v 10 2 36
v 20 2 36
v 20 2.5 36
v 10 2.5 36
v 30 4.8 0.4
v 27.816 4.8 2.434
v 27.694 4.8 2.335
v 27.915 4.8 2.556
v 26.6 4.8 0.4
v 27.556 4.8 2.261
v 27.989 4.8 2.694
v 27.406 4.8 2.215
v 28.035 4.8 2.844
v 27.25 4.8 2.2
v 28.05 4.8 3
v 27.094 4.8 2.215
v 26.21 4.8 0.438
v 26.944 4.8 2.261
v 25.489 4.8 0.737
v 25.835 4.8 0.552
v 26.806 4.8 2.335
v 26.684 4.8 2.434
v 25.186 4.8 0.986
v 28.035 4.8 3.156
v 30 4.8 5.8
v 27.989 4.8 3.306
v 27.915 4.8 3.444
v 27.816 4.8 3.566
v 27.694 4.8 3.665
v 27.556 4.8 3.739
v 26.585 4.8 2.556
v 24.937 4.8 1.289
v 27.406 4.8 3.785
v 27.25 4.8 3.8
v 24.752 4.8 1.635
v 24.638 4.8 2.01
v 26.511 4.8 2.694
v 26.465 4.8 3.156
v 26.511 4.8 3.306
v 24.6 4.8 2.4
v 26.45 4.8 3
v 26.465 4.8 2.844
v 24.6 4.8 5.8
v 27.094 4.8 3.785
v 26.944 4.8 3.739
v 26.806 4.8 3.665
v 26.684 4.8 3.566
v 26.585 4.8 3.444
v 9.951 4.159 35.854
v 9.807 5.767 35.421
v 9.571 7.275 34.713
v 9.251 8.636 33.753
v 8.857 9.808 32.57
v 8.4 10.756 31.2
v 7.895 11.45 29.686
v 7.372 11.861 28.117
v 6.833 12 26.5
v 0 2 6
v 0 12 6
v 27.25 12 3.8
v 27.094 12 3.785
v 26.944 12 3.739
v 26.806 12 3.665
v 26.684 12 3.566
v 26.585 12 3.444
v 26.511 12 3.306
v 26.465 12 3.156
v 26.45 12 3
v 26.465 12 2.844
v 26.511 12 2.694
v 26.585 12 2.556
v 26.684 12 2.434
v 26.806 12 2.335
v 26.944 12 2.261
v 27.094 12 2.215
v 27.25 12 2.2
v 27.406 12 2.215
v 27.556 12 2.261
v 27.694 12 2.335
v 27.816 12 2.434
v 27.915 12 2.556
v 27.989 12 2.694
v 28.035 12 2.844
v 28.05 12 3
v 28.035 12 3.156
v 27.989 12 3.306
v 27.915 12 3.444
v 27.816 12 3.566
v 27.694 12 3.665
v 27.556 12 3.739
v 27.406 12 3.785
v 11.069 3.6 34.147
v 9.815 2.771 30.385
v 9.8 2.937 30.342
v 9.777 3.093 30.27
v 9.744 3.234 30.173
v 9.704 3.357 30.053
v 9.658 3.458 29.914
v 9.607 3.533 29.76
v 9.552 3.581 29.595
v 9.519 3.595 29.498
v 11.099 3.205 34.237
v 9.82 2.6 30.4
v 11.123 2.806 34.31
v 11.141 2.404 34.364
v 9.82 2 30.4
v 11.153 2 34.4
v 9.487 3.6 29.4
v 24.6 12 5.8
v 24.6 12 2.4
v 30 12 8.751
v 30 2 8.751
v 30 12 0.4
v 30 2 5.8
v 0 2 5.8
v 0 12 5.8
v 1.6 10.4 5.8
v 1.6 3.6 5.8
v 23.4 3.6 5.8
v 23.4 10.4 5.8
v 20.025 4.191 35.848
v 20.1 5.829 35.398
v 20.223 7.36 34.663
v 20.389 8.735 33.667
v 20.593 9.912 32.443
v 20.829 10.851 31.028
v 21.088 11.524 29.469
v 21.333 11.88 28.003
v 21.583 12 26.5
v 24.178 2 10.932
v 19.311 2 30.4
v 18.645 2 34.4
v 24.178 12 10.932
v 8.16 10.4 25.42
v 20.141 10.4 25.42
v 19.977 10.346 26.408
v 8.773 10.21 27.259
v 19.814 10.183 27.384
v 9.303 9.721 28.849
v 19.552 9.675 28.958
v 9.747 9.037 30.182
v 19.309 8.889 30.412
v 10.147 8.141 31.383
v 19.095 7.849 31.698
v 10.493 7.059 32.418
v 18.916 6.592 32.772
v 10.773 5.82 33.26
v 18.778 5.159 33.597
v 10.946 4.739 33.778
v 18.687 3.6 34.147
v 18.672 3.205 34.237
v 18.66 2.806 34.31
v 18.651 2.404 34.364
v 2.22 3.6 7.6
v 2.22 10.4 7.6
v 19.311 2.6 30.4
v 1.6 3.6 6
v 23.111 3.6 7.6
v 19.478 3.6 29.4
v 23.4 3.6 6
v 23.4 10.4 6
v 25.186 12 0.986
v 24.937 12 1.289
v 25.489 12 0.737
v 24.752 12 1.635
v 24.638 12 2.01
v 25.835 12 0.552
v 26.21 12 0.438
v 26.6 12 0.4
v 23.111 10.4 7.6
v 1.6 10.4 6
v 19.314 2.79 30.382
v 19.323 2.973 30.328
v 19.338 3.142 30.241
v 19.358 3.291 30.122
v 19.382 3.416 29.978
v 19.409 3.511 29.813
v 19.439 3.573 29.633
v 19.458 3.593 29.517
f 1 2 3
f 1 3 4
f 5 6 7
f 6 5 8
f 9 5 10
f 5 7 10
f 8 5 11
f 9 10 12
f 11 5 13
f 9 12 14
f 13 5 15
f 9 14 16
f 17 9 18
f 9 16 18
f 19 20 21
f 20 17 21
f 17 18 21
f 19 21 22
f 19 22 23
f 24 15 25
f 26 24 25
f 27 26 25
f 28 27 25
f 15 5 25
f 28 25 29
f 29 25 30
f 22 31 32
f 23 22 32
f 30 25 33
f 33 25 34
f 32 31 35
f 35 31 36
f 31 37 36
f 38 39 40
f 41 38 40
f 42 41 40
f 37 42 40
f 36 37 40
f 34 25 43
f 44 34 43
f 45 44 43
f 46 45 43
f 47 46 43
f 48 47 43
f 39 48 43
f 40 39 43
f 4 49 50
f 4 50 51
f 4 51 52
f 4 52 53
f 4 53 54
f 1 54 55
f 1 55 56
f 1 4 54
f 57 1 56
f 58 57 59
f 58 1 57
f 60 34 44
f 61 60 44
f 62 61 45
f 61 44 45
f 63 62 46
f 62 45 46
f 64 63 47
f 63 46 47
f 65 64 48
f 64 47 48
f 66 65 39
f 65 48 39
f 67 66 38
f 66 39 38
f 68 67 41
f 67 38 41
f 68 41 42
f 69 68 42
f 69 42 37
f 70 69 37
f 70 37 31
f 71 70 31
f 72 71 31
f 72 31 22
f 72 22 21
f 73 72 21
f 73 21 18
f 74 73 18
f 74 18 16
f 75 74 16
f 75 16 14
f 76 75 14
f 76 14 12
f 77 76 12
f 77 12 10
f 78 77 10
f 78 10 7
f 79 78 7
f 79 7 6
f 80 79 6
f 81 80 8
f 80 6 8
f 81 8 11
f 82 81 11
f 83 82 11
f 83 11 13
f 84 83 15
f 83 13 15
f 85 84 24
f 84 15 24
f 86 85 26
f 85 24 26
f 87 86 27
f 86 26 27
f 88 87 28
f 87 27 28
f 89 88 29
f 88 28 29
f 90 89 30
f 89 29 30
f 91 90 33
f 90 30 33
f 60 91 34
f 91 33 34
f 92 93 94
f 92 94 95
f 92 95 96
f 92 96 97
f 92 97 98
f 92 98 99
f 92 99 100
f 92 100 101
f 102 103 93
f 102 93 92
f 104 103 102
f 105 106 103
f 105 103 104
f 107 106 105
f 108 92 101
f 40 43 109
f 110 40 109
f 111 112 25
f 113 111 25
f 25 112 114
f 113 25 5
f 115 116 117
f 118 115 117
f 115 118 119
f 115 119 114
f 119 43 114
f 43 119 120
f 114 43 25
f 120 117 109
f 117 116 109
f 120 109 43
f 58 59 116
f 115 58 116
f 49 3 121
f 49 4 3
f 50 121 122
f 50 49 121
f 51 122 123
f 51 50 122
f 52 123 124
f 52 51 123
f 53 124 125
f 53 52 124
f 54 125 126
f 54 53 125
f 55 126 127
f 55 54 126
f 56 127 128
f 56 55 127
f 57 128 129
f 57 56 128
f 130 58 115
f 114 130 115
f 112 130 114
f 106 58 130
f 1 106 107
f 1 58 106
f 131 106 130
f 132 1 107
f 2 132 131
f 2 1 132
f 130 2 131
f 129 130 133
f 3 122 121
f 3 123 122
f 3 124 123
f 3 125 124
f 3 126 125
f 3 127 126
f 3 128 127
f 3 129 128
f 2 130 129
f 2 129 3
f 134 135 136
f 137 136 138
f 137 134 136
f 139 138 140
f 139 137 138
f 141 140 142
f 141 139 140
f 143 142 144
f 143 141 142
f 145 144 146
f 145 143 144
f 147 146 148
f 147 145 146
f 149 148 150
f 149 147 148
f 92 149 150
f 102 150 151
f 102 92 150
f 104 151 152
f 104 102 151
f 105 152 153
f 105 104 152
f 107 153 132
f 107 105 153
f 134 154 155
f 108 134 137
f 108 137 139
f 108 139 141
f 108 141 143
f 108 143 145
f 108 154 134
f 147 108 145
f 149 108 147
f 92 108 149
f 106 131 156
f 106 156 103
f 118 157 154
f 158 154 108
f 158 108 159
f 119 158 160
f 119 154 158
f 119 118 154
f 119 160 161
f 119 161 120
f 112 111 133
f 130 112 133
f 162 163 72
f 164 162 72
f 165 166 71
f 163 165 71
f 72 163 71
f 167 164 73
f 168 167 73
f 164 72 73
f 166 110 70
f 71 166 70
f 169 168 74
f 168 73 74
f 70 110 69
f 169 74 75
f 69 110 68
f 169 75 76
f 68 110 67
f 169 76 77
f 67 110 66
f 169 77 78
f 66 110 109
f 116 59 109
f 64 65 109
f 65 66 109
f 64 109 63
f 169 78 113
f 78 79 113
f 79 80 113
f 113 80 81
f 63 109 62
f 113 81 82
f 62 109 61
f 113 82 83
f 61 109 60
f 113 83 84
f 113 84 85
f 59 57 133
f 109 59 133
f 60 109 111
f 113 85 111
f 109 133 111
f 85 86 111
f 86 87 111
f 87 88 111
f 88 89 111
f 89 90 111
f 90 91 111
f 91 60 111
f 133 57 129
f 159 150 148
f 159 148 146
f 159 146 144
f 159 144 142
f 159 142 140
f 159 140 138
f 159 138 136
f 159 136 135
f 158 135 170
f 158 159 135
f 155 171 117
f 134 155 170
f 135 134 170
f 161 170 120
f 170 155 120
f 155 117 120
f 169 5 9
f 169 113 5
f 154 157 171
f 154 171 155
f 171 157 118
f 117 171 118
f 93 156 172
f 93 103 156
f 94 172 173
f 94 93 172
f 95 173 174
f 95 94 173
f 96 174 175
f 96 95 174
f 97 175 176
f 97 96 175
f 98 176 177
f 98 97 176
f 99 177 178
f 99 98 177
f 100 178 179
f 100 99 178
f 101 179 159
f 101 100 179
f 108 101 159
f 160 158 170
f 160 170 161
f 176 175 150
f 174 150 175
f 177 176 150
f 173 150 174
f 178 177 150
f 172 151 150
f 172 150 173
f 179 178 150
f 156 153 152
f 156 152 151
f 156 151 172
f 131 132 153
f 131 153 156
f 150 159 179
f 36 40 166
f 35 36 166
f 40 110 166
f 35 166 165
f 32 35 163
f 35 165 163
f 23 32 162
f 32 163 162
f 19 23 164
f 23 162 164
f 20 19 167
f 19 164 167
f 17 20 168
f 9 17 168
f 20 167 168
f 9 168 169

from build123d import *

# Parameters (mm, degrees)
SKETCH_1_W          = 30
SKETCH_1_H          = 6
EXTRUDE_1_DEPTH     = 2
SKETCH_2_R          = 0.8
CUT_EXTRUDE_1_DEPTH = 2
SKETCH_3_W          = 1.6
SKETCH_3_H          = 0.2
EXTRUDE_2_DEPTH     = 10
SKETCH_4_W          = 21.8
SKETCH_4_H          = 0.2
EXTRUDE_3_DEPTH     = 1.6
SKETCH_5_W          = 5
SKETCH_5_H          = 0.2
EXTRUDE_4_DEPTH     = 10
SKETCH_6_W          = 5.4
SKETCH_6_H          = 7.2
EXTRUDE_5_DEPTH     = 5.4
FILLET_1_R          = 2
SKETCH_7_R          = 0.8
CUT_EXTRUDE_2_DEPTH = 32.429922049
SKETCH_8_W          = 6
SKETCH_8_H          = 2
CUT_EXTRUDE_3_DEPTH = 33.86335345
SKETCH_9_W          = 21.8
SKETCH_9_H          = 1.6
EXTRUDE_7_DEPTH     = 0.2
EXTRUDE_9_DEPTH     = 1.6
EXTRUDE_10_REACH    = 49.608
EXTRUDE_11_DEPTH    = 1.6
CUT_EXTRUDE_4_DEPTH = 1.6
FILLET_2_R          = 9
FILLET_3_R          = 9.5
FILLET_4_R          = 1
CHAMFER_1_SIZE      = 12.342759107
CHAMFER_1_SIZE_2    = 5


with BuildPart() as part:
    # 草图1 → 凸台-拉伸1 (new body)
    with BuildSketch(Plane(origin=(0, 0, 0), x_dir=(1, 0, 0), z_dir=(0, 1, 0))):
        with Locations((15, -3)):
            Rectangle(SKETCH_1_W, SKETCH_1_H)
    extrude(amount=EXTRUDE_1_DEPTH)

    # 草图2 → 切除-拉伸1 (cut)
    with BuildSketch(Plane(origin=(0, 2, 0), x_dir=(1, 0, 0), z_dir=(0, 1, 0))):
        with Locations(Location((27.25, -3, 0), (0, 0, 270))):
            Circle(SKETCH_2_R)
    extrude(amount=-CUT_EXTRUDE_1_DEPTH, mode=Mode.SUBTRACT)

    # 草图3 → 凸台-拉伸2 (add)
    with BuildSketch(Plane(origin=(0, 2, 0), x_dir=(1, 0, 0), z_dir=(0, 1, 0))):
        with Locations((0.8, -5.9)):
            Rectangle(SKETCH_3_W, SKETCH_3_H)
        with Locations((24.2, -5.9)):
            Rectangle(SKETCH_3_W, SKETCH_3_H)
    extrude(amount=EXTRUDE_2_DEPTH)

    # 草图4 → 凸台-拉伸3 (add)
    with BuildSketch(Plane(origin=(0, 12, 0), x_dir=(1, 0, 0), z_dir=(0, 1, 0))):
        with Locations((12.5, -5.9)):
            Rectangle(SKETCH_4_W, SKETCH_4_H)
    extrude(amount=-EXTRUDE_3_DEPTH)

    # 草图5 → 凸台-拉伸4 (add)
    with BuildSketch(Plane(origin=(0, 2, 0), x_dir=(1, 0, 0), z_dir=(0, 1, 0))):
        with Locations((27.5, -5.9)):
            Rectangle(SKETCH_5_W, SKETCH_5_H)
    extrude(amount=EXTRUDE_4_DEPTH)

    # 草图6 → 凸台-拉伸5 (add)
    with BuildSketch(Plane(origin=(0, 0, 5.8), x_dir=(-1, 0, 0), z_dir=(0, 0, -1))):
        with Locations((-27.3, 8.4)):
            Rectangle(SKETCH_6_W, SKETCH_6_H)
    extrude(amount=EXTRUDE_5_DEPTH)

    # 圆角1
    fillet_1_edges = [part.edges().sort_by_distance(p)[0] for p in [
        (24.6, 8.4, 0.4),
    ]]
    fillet(fillet_1_edges, radius=FILLET_1_R)

    # 草图7 → 切除-拉伸2 (cut, through all)
    with BuildSketch(Plane(origin=(0, 4.8, 0), x_dir=(-1, 0, 0), z_dir=(0, -1, 0))):
        with Locations(Location((-27.25, -3, 0), (0, 0, 270))):
            Circle(SKETCH_7_R)
    extrude(amount=-CUT_EXTRUDE_2_DEPTH, mode=Mode.SUBTRACT)

    # 草图8 → 切除-拉伸3 (cut, through all)
    with BuildSketch(Plane.ZY):
        with Locations((3, 1)):
            Rectangle(SKETCH_8_W, SKETCH_8_H)
    extrude(amount=-CUT_EXTRUDE_3_DEPTH, mode=Mode.SUBTRACT)

    # 草图9 → 凸台-拉伸7 (add)
    with BuildSketch(Plane.XY.offset(6)):
        with Locations((12.5, 2.8)):
            Rectangle(SKETCH_9_W, SKETCH_9_H)
    extrude(amount=-EXTRUDE_7_DEPTH)

    # 草图11 → 凸台-拉伸9 (add)
    with BuildSketch(Plane(origin=(0, 2, 0), x_dir=(-1, 0, 0), z_dir=(0, -1, 0))):
        Polygon((0, -6), (-10, -36), (-20, -36), (-25, -6), align=None)
    extrude(amount=-EXTRUDE_9_DEPTH)

    # 凸台-拉伸10: up to this face of the body (flat: up to its plane)
    extrude_10_end = Plane(part.part.faces().sort_by_distance((25.077544524, 12, 3.686395467))[0])
    # 草图12 → 凸台-拉伸10 (add, up to the picked face)
    with BuildSketch(Plane(origin=(0, 3.6, 0), x_dir=(1, 0, 0), z_dir=(0, 1, 0)), mode=Mode.PRIVATE) as extrude_10_sk1:
        Polygon((2.219881419, -7.6), (11.153214752, -34.4), (18.644596659, -34.4), (23.111263325, -7.6), (23.4, -6), (25, -6), (20, -36), (10, -36), (0, -6), (1.6, -6), align=None)
    extrude_10_tool1 = split(extrude(extrude_10_sk1.sketch, amount=EXTRUDE_10_REACH, mode=Mode.PRIVATE), bisect_by=extrude_10_end, keep=Keep.BOTH, mode=Mode.PRIVATE)
    add(extrude_10_tool1.solids().sort_by(Axis((6.316075, 3.6, 21.123491), (0, 1, 0)))[0])

    # 草图13 → 凸台-拉伸11 (add)
    with BuildSketch(Plane(origin=(0, 12, 0), x_dir=(1, 0, 0), z_dir=(0, 1, 0))):
        Polygon((1.6, -5.8), (1.6, -6), (2.219881419, -7.6), (11.153214752, -34.4), (18.644596659, -34.4), (23.111263325, -7.6), (23.4, -6), (23.4, -5.8), align=None)
    extrude(amount=-EXTRUDE_11_DEPTH)

    # 草图15 → 切除-拉伸4 (cut)
    with BuildSketch(Plane.XZ.offset(-2)):
        Polygon((11.153214752, 34.4), (18.644596659, 34.4), (19.311263325, 30.4), (9.819881419, 30.4), align=None)
    extrude(amount=-CUT_EXTRUDE_4_DEPTH, mode=Mode.SUBTRACT)

    # 圆角2
    # the kernel refuses this fillet: 9 mm, written as the material it adds along each edge
    with BuildSketch(Plane(origin=(-11.296729569, 10.4, 34.4), x_dir=(0, -1, 0), z_dir=(1, 0, 0))) as fillet_2_piece_1_section:
        with BuildLine():
            CenterArc((9, 8.979977728), FILLET_2_R, 180, 86.177446271)
            Line((0, 8.979977728), (-0.18, 8.979977728))
            Line((-0.18, 8.979977728), (-0.18, 0))
            Line((-0.18, 0), (0, -0.18))
            ThreePointArc((0, -0.18), (4.2, -0.18), (8.388, -0.179599555))
            Line((8.388, -0.179599555), (8.4, 0))
        make_face()
    fillet_2_piece_1 = extrude(amount=52.391270548, mode=Mode.PRIVATE)
    fillet_2_piece_1 = split(fillet_2_piece_1, bisect_by=Plane(origin=(10.82791011, 8.54108789, 33.424086075), z_dir=(0.9486832980505115, 0, -0.3162277660168449)), keep=Keep.TOP, mode=Mode.PRIVATE)
    fillet_2_piece_1 = split(fillet_2_piece_1, bisect_by=Plane(origin=(18.906334999, 8.54108789, 32.829569958), z_dir=(-0.9863939238321403, 0, -0.16439898730537805)), keep=Keep.TOP, mode=Mode.PRIVATE)
    add(fillet_2_piece_1)

    # 圆角3
    fillet_3_edges = [part.edges().sort_by_distance(p)[0] for p in [
        (15, 12, 36),
    ]]
    fillet(fillet_3_edges, radius=FILLET_3_R)

    # 圆角4
    fillet_4_edges = [part.edges().sort_by_distance(p)[0] for p in [
        (14.565572372, 3.6, 30.4),
    ]]
    fillet(fillet_4_edges, radius=FILLET_4_R)

    # 倒角1
    # the kernel refuses this chamfer: 12.342759107, 5 mm, written as the material it adds along each edge
    with BuildSketch(Plane(origin=(25, 12, 6), x_dir=(0.9999085325872852, 0, -0.013525030837001994), z_dir=(0, -1, 0))) as chamfer_1_piece_1_section:
        Polygon((CHAMFER_1_SIZE * 0.99990853261, CHAMFER_1_SIZE * 0.0135250308373), (-CHAMFER_1_SIZE_2 * 0.177724958393, CHAMFER_1_SIZE_2 * 0.984080199559), (0, 0), align=None)
    chamfer_1_piece_1 = extrude(amount=10, mode=Mode.PRIVATE)
    chamfer_1_piece_1 = split(chamfer_1_piece_1, bisect_by=Plane(origin=(30, 7, 7.970980812), z_dir=(-1, 0, 0)), keep=Keep.TOP, mode=Mode.PRIVATE)
    add(chamfer_1_piece_1)


solid = part.part
